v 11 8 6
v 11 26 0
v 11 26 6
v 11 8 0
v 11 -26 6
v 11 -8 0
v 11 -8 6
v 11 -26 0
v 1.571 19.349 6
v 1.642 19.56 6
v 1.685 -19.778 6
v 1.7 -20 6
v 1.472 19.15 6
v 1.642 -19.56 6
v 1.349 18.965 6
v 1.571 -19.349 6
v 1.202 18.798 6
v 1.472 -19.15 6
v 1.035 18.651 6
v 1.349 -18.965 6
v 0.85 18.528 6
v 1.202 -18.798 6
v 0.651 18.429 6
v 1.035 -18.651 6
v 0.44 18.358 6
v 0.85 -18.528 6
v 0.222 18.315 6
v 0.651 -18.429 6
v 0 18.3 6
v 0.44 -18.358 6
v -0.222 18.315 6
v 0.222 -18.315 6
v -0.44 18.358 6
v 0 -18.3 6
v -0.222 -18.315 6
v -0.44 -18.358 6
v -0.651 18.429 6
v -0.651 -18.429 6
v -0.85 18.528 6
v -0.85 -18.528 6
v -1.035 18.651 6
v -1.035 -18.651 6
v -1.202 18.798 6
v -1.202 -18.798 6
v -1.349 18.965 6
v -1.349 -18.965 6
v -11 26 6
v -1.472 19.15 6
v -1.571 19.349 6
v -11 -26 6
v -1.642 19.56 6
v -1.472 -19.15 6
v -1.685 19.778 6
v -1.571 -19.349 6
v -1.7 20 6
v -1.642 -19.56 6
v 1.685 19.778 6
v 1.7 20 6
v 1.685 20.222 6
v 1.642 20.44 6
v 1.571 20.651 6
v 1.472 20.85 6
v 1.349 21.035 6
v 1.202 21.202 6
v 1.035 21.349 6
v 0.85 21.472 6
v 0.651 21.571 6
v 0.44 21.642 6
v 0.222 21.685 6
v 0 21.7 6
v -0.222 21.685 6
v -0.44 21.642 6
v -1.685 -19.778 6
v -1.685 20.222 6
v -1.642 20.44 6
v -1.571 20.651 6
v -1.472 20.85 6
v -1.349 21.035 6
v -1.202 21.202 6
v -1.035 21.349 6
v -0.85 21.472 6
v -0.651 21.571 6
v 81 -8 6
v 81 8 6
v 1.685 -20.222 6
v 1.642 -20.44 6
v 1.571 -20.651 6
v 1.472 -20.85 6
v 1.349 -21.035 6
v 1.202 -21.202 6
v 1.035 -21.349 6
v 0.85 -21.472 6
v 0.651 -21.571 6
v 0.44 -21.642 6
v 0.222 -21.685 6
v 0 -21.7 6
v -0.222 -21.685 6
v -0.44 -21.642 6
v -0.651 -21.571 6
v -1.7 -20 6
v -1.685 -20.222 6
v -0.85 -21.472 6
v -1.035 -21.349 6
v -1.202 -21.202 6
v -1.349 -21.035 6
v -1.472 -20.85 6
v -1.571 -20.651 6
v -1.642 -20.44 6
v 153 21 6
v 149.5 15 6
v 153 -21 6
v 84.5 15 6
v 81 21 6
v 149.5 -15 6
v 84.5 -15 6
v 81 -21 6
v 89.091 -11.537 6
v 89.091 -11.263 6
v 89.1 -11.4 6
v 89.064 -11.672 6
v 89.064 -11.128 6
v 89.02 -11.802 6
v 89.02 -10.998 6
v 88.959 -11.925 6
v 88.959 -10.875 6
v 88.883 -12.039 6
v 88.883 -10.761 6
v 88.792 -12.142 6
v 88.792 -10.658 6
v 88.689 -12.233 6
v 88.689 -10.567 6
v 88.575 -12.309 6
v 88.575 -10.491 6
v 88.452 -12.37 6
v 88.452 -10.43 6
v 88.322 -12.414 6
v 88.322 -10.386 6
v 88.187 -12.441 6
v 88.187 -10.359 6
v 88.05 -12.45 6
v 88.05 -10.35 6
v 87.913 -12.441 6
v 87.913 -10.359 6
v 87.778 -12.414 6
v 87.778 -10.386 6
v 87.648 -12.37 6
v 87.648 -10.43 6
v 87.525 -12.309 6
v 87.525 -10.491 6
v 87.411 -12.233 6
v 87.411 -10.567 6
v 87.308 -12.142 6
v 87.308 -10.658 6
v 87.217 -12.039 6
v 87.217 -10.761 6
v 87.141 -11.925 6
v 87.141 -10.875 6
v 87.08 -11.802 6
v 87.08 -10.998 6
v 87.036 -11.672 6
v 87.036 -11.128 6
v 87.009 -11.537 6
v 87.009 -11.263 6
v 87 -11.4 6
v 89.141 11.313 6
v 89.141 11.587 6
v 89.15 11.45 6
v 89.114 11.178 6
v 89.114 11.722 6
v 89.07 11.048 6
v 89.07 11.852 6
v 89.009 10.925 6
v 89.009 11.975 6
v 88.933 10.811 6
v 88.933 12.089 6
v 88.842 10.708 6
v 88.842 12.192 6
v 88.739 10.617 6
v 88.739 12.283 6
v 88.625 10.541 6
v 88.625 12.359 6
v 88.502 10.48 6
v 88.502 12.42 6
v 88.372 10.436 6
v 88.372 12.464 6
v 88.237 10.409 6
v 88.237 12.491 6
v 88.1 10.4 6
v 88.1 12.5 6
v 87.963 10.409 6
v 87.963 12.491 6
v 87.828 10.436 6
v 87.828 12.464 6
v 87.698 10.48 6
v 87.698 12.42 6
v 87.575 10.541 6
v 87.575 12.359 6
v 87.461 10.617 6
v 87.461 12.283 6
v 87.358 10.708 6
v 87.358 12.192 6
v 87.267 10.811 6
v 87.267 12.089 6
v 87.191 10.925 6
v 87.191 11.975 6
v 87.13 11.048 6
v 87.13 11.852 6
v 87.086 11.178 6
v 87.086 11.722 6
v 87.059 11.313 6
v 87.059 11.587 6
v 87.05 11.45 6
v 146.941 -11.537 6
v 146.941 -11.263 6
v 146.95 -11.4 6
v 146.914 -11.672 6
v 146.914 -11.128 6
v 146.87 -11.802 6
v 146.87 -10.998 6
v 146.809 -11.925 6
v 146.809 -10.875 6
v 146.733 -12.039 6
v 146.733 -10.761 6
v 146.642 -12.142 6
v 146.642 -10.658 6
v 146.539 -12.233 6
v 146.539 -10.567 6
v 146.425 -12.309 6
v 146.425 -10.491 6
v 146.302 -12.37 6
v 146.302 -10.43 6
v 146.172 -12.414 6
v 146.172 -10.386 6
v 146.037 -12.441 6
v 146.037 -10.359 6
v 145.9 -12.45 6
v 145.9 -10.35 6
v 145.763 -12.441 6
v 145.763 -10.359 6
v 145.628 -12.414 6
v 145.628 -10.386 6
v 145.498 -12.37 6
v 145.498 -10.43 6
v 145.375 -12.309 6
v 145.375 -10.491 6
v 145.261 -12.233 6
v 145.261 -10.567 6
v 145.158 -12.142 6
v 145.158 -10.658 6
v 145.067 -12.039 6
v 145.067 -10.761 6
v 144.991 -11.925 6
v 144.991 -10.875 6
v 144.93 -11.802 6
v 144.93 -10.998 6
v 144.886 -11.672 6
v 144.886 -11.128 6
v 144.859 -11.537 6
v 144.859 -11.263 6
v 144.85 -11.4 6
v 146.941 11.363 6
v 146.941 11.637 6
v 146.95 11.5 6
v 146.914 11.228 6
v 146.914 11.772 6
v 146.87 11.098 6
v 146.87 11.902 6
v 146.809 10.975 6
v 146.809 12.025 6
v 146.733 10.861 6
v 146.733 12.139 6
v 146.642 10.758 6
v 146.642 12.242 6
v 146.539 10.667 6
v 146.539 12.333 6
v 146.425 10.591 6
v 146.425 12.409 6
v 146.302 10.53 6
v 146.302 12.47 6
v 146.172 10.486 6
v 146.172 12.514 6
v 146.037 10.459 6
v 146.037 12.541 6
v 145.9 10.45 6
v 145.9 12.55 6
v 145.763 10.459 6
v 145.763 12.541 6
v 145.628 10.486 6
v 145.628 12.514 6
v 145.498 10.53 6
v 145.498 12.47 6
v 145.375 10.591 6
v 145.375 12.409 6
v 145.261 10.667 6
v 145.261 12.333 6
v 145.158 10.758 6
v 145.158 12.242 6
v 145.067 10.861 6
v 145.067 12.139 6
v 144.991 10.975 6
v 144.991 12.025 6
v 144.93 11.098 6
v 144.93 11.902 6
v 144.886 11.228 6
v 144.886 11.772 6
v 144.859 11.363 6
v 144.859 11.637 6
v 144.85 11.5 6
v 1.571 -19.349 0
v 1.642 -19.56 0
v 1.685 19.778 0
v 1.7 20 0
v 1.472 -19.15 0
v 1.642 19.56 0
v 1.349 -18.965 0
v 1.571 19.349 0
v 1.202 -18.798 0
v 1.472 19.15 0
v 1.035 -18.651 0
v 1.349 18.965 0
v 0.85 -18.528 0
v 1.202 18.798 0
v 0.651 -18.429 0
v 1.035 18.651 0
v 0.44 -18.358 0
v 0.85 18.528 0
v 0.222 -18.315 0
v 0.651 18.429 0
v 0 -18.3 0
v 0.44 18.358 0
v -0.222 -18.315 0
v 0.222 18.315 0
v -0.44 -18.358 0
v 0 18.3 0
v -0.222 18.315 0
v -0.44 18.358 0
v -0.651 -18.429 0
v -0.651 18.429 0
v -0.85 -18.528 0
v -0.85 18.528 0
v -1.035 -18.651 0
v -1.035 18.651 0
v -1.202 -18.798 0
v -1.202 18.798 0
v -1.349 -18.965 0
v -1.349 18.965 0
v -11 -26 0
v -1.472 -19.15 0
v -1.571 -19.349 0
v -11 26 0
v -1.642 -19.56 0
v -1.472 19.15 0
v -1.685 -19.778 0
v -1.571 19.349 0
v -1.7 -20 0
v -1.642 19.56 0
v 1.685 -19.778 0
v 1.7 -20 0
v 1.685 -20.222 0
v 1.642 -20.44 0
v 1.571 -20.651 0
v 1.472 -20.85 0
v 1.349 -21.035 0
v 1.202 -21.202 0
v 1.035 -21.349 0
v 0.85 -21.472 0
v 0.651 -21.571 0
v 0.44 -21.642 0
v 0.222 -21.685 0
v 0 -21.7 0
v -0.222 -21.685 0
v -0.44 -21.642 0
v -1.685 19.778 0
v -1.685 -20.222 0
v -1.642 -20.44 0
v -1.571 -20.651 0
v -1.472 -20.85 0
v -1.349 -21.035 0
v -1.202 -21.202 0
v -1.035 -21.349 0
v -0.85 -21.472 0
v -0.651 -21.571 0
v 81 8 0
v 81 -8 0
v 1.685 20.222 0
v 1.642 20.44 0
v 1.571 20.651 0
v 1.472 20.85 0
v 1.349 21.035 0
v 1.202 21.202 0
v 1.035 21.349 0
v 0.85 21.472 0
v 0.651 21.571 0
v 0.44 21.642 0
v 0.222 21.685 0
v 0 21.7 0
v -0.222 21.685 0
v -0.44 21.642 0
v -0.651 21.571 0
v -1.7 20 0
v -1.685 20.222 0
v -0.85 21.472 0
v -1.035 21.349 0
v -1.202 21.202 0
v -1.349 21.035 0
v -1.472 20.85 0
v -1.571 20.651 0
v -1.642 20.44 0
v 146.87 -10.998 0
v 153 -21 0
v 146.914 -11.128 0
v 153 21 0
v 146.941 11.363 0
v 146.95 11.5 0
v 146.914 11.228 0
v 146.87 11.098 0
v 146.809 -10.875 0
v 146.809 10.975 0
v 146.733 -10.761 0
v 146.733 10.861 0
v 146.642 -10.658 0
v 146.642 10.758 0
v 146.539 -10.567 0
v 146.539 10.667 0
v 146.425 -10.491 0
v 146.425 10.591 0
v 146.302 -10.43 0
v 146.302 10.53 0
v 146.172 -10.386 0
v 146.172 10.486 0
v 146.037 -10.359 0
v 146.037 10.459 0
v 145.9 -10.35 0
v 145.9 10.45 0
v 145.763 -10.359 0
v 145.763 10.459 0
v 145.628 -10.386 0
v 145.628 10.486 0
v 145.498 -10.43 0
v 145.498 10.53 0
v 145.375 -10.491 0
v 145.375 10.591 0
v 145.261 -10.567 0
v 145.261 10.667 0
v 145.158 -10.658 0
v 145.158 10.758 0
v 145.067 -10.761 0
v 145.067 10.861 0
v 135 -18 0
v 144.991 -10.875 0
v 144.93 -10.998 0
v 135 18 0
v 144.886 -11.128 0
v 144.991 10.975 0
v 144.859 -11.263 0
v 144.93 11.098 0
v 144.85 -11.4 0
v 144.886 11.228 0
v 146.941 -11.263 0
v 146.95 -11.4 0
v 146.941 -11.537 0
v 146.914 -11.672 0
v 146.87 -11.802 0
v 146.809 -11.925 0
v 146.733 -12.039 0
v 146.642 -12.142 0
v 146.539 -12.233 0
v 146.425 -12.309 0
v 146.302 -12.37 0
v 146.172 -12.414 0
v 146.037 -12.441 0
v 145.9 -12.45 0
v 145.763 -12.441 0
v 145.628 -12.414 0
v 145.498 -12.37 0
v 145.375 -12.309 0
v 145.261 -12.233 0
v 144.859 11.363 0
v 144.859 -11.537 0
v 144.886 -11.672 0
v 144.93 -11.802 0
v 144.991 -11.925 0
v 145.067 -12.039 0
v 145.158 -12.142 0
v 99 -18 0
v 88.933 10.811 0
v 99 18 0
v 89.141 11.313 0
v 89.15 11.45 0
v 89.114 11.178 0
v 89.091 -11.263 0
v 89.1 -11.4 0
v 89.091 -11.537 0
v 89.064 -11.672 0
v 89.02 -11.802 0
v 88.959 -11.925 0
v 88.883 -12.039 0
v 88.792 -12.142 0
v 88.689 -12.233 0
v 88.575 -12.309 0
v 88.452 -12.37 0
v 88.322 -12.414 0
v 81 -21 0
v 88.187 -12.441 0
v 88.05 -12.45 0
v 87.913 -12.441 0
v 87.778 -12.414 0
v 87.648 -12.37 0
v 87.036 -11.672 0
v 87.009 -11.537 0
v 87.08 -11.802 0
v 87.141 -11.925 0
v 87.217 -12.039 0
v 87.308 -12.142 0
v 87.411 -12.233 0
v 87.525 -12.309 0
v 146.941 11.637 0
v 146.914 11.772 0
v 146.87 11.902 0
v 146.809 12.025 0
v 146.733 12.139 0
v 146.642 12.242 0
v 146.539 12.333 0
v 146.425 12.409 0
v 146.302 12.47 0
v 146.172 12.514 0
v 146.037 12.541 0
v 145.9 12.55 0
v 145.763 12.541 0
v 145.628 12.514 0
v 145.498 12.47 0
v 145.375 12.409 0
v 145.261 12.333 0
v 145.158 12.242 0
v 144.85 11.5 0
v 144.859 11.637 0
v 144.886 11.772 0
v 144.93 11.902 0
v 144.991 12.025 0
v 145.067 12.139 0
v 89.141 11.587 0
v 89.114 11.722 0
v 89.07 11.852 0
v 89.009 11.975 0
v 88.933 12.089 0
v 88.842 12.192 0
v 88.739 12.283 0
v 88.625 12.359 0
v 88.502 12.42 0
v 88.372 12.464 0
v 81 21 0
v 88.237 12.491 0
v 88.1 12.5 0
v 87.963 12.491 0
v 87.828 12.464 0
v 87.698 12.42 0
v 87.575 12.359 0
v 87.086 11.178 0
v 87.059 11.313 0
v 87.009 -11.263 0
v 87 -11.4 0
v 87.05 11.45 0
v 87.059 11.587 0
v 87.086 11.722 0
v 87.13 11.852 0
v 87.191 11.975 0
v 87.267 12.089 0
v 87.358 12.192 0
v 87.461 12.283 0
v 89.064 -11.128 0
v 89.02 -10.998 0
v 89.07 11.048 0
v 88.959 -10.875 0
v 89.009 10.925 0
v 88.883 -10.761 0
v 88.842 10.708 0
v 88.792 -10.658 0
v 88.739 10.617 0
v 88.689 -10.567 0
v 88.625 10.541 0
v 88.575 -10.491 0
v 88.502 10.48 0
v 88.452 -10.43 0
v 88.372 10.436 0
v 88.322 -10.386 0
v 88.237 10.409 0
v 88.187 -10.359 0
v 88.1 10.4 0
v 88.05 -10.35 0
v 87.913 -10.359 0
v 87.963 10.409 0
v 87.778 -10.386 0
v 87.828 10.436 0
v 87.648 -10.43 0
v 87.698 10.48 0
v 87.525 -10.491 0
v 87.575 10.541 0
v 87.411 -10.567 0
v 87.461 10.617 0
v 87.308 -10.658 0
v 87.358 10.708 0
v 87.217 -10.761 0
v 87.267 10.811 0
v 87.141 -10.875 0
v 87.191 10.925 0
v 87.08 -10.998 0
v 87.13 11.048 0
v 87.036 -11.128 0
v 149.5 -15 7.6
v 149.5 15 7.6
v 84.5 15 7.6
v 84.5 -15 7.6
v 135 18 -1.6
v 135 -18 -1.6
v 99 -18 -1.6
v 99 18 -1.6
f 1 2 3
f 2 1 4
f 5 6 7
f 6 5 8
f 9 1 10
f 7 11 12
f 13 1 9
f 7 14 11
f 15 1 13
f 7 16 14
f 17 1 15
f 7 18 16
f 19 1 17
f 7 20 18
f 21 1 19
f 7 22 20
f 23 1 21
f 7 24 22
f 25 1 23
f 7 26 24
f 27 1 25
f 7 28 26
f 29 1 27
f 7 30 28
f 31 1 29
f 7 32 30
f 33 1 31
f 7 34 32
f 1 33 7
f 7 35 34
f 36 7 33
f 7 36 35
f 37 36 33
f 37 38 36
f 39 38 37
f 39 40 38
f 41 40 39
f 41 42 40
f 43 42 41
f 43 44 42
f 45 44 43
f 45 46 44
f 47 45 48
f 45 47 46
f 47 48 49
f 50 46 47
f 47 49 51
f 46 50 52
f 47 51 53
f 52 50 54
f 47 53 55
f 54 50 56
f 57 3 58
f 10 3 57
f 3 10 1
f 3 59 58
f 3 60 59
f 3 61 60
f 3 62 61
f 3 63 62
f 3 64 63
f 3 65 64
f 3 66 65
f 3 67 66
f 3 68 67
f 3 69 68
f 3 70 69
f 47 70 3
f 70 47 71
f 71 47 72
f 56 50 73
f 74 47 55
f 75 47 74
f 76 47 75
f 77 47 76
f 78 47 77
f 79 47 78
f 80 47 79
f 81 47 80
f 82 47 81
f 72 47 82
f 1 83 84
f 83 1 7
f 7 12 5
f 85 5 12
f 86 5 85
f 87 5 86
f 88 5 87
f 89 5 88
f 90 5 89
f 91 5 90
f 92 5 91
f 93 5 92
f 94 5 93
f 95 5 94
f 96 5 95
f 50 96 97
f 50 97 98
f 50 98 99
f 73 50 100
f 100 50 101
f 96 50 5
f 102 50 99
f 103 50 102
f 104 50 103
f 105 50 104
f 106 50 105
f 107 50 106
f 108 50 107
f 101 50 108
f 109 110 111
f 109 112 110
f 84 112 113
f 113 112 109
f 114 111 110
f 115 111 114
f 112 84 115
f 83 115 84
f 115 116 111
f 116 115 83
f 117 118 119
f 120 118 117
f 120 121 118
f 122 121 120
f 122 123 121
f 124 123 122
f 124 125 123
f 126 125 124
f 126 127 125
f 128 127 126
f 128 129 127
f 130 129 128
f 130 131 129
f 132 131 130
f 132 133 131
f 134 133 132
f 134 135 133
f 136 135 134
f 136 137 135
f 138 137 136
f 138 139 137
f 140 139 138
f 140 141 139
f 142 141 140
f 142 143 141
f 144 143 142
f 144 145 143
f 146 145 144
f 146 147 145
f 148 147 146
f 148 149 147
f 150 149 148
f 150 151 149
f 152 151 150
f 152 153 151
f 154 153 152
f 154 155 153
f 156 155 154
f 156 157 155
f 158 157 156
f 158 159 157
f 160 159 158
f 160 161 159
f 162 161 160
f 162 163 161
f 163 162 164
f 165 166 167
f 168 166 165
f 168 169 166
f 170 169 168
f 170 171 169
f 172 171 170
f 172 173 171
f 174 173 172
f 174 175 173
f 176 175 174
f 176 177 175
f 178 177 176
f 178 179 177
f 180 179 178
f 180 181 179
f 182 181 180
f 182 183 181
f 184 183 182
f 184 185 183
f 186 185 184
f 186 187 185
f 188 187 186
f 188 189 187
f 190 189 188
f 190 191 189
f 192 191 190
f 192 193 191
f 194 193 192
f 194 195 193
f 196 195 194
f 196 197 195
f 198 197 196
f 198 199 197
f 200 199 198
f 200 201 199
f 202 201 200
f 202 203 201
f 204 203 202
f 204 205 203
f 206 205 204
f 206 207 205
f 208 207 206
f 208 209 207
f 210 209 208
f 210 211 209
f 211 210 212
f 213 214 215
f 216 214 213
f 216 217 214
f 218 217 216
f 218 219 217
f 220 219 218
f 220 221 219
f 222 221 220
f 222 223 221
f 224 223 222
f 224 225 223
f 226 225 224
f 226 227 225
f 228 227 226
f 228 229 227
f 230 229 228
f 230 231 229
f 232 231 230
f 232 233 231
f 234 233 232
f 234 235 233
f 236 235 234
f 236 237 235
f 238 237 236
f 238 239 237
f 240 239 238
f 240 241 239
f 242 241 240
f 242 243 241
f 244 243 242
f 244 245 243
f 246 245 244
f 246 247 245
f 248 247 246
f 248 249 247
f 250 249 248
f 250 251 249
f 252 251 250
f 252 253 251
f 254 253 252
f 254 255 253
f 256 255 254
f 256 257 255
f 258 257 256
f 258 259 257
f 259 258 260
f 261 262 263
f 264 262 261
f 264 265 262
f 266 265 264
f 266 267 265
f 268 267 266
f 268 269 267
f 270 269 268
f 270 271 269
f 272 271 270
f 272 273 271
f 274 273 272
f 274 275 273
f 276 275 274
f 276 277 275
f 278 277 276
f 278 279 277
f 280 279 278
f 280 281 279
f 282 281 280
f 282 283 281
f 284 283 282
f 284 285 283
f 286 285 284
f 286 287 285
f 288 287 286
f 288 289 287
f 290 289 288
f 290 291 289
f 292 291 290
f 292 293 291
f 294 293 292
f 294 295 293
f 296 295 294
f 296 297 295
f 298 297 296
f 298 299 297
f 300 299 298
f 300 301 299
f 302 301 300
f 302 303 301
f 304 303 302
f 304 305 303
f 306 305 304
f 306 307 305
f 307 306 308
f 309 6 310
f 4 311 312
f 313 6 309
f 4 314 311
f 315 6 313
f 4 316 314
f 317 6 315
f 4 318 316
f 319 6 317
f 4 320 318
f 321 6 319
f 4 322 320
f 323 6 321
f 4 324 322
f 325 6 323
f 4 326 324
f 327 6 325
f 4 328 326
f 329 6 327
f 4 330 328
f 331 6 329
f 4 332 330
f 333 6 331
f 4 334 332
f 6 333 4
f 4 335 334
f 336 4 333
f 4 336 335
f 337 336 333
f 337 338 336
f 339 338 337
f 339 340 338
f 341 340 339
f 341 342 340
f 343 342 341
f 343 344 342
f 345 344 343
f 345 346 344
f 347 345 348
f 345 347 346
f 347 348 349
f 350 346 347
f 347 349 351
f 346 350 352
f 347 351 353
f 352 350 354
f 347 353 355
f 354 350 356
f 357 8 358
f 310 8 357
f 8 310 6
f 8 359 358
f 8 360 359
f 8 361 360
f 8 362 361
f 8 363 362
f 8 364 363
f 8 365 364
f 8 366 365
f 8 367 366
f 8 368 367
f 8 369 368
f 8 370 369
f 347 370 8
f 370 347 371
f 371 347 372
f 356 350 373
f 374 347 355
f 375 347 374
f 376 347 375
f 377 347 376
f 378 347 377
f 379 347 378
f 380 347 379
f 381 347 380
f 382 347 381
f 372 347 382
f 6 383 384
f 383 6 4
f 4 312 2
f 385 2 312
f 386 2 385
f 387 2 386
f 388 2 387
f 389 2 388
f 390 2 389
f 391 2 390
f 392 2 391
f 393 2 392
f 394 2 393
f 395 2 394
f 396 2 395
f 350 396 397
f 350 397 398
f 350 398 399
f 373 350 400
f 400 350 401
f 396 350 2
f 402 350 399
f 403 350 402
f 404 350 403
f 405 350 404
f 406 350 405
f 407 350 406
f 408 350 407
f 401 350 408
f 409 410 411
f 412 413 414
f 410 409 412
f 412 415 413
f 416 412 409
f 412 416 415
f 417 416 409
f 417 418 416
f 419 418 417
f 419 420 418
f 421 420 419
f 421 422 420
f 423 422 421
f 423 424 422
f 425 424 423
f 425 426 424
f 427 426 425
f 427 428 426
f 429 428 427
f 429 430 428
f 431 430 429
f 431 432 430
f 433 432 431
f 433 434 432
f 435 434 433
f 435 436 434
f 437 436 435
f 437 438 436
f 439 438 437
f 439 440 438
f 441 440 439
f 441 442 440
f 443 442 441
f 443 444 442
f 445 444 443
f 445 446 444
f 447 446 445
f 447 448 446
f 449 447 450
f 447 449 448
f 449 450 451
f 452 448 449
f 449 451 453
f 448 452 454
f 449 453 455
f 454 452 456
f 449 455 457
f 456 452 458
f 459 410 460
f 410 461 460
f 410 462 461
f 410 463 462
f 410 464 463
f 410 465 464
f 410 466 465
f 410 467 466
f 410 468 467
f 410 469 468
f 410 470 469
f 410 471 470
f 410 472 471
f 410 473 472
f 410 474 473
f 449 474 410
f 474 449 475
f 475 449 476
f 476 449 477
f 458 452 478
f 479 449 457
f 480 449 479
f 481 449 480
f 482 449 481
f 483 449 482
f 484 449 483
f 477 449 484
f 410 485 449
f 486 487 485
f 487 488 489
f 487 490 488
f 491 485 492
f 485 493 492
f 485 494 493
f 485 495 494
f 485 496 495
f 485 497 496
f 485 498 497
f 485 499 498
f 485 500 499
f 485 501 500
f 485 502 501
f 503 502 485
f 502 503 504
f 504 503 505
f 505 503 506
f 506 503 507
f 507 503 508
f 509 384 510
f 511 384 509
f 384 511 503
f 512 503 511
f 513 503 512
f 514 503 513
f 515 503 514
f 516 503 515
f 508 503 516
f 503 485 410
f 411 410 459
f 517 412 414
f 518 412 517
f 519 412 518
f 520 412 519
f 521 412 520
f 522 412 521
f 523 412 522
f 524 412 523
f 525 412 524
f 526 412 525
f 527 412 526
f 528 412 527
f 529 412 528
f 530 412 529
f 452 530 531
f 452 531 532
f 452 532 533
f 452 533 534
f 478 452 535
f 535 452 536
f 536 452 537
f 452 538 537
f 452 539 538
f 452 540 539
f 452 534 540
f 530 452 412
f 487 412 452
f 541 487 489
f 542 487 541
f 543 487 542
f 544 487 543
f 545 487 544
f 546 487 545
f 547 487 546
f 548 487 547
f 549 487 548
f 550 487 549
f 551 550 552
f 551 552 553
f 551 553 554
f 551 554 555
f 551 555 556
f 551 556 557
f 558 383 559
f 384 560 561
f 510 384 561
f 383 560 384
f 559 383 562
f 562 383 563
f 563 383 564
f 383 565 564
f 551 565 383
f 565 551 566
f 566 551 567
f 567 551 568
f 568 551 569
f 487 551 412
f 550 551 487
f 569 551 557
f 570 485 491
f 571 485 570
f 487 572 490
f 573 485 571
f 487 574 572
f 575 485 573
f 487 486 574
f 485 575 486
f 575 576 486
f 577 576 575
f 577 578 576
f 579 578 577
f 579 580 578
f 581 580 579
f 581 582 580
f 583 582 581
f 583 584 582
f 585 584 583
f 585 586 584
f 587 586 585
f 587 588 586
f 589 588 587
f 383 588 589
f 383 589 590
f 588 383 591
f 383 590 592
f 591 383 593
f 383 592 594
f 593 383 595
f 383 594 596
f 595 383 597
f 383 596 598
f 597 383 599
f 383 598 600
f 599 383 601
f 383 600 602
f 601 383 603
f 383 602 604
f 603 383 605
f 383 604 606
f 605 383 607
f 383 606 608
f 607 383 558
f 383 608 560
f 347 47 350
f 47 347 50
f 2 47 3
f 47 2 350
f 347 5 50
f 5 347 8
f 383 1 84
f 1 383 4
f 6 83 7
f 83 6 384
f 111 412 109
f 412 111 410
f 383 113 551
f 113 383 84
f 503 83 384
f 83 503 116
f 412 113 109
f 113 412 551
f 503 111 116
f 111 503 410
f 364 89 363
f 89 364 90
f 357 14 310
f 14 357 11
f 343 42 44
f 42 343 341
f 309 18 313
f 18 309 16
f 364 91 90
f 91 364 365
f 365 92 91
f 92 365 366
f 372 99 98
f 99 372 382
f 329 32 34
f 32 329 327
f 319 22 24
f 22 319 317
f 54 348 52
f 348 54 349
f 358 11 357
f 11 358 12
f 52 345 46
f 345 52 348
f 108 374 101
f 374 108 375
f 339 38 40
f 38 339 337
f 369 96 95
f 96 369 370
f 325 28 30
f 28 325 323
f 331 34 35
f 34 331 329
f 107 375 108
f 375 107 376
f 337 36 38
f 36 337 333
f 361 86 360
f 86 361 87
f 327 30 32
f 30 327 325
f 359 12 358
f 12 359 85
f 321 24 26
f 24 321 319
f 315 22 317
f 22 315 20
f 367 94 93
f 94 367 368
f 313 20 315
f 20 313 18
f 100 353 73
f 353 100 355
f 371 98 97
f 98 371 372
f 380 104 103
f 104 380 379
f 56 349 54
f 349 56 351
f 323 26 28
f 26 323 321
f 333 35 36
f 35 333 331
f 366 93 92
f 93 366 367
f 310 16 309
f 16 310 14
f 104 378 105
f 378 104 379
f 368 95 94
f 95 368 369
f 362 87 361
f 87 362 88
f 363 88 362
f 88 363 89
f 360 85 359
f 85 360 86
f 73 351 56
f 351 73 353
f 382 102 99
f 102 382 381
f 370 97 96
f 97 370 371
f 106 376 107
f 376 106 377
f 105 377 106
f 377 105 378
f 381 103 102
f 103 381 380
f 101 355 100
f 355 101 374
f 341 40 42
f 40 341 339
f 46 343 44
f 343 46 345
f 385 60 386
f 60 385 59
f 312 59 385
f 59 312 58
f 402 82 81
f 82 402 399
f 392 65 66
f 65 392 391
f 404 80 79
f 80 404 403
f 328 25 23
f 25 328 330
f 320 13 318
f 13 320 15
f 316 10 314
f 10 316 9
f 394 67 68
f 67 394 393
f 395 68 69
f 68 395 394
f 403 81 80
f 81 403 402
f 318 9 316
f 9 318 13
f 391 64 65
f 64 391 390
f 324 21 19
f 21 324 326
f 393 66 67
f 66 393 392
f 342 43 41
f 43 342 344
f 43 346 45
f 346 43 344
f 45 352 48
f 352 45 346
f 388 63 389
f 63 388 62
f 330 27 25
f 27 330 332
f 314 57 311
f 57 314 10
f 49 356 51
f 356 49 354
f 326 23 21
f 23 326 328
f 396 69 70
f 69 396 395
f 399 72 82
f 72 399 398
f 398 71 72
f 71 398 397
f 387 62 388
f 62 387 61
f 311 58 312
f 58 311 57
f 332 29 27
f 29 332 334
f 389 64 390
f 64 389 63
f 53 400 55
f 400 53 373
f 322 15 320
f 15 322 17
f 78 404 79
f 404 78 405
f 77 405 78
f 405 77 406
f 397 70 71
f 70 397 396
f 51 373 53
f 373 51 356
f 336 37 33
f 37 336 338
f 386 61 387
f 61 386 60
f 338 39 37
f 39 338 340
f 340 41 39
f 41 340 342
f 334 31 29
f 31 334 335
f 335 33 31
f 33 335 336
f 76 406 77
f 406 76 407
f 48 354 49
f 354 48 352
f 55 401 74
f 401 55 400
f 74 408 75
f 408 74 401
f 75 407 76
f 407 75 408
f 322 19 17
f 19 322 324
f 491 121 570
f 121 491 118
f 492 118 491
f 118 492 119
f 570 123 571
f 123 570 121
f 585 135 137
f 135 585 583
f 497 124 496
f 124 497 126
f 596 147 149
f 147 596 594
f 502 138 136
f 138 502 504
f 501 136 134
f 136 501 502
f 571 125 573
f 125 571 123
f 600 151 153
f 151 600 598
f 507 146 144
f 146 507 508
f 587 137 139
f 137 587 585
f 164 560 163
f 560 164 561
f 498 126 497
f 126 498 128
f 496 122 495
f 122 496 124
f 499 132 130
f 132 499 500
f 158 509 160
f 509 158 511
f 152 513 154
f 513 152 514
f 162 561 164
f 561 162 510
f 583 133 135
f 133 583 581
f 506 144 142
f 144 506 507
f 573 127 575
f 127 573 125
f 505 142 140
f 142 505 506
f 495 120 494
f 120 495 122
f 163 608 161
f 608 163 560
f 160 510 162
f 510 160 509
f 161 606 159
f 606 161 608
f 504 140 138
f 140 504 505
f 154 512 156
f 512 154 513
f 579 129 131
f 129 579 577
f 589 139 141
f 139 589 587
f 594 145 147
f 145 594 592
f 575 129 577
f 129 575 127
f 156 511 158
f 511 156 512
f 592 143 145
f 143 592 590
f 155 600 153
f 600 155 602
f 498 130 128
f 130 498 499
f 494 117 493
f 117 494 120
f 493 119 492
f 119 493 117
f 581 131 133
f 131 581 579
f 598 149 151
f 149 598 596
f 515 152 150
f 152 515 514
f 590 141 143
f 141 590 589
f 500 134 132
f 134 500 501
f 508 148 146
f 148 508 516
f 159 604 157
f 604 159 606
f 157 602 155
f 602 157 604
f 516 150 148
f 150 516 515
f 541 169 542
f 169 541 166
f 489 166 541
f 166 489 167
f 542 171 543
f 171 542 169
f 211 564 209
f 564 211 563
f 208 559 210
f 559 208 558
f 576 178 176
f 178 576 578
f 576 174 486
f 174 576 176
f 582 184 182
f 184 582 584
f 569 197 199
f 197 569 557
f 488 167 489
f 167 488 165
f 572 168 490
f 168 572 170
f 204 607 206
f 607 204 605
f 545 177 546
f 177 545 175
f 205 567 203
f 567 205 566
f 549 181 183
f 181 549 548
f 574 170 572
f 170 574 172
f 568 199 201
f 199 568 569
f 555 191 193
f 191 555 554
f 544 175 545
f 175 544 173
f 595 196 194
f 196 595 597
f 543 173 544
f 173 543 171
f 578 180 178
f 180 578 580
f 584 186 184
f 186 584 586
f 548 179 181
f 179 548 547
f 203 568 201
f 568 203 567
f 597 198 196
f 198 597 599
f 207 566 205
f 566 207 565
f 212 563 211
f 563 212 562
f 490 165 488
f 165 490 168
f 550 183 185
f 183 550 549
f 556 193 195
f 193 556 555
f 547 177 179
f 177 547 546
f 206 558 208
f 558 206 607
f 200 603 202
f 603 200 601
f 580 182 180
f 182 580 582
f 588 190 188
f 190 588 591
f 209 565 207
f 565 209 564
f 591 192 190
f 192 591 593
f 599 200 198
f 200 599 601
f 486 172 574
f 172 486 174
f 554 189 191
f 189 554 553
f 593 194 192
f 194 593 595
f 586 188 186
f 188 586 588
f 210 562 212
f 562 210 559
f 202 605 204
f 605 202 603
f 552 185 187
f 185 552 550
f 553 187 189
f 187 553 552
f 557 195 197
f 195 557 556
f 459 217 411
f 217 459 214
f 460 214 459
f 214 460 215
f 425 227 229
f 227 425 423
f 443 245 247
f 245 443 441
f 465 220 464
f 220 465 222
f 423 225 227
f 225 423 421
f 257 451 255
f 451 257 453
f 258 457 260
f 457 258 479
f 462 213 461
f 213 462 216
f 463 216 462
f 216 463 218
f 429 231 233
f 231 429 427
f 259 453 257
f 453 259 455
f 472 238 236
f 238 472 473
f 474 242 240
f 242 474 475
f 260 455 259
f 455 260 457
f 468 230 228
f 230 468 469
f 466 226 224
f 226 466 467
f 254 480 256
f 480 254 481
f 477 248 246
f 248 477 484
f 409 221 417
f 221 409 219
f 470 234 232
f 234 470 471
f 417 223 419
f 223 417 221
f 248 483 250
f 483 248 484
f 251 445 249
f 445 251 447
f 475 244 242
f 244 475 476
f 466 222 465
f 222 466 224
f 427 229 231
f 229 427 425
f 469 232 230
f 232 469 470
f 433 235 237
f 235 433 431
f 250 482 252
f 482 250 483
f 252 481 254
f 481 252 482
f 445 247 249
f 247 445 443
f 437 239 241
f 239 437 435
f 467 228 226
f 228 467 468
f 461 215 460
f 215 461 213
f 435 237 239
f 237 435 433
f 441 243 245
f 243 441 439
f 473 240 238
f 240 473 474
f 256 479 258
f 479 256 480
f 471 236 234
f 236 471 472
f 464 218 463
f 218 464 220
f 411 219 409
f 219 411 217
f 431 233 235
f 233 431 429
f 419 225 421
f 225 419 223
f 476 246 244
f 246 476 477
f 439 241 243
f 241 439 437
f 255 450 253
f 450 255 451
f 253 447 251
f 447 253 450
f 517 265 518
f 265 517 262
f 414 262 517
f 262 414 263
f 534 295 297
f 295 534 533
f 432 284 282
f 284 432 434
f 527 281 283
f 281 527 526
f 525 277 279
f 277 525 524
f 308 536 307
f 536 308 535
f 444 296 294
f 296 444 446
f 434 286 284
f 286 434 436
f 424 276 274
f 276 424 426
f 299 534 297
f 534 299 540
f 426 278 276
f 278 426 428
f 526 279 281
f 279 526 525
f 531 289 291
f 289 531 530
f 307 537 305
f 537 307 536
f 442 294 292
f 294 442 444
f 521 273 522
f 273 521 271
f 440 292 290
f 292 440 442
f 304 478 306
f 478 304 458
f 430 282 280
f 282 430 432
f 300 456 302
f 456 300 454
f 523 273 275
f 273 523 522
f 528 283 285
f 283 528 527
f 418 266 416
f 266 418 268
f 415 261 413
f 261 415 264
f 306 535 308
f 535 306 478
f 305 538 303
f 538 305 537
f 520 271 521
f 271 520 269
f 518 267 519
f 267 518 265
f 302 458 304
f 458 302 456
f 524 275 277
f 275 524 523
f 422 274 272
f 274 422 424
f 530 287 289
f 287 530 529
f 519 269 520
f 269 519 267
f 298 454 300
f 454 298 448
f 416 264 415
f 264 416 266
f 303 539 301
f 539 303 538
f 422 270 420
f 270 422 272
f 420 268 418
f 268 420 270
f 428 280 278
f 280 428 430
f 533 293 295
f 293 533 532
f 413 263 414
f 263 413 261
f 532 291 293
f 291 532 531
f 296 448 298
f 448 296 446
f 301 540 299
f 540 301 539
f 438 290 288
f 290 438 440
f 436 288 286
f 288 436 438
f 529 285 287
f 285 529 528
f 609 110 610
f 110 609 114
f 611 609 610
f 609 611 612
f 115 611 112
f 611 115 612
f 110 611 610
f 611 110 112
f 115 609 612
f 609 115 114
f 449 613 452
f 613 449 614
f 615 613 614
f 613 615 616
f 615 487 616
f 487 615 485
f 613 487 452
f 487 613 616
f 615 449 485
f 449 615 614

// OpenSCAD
// Y-axis pad mount — Ender-3 V3 SE
// Keeps Twnzl/bioxz 40 mm vertical M3 pair (CC BY-SA concept).
// Drops the Pi Zero box. Solid shoe + truss + pad.
// One face: Zero 3W (65 x 30, M2.5 pilots). Other face: 3M-tape camera.
//
// PRINT: whole part is a 6 mm plate, large face on the bed. No lattice.
// part = "print" | "preview"

part = "preview"; // [print, preview]

$fn = 48;

screw_spacing = 40.0;
m3_clear      = 3.4;
t             = 6.0;

shoe_w = 22.0;
shoe_h = 52.0;

truss_w = 16.0;
truss_l = 70.0;

pad_w = 72.0;   // along truss (X)
pad_h = 42.0;   // across (Y)

z3w_x = 65.0;
z3w_y = 30.0;
z3w_holes = [[3.55,3.60],[3.60,26.45],[61.40,3.60],[61.40,26.50]];
z3w_pilot = 2.1;

// print coords: Z = thickness. Holes along Y. Truss +X.
// shoe centered on origin.
pad_x0 = shoe_w/2 + truss_l;
pad_cx = pad_x0 + pad_w/2;
pad_cy = 0;

module plate() {
    difference() {
        union() {
            translate([-shoe_w/2, -shoe_h/2, 0])
                cube([shoe_w, shoe_h, t]);
            translate([shoe_w/2 - 0.1, -truss_w/2, 0])
                cube([truss_l + 0.2, truss_w, t]);
            translate([pad_x0, -pad_h/2, 0])
                cube([pad_w, pad_h, t]);
        }
        for (sy = [-screw_spacing/2, screw_spacing/2])
            translate([0, sy, -1])
                cylinder(d = m3_clear, h = t + 2);
        // Zero 3W pilots through the pad (either face)
        for (hxy = z3w_holes)
            translate([
                pad_cx - z3w_x/2 + hxy[0],
                pad_cy - z3w_y/2 + hxy[1],
                -1
            ])
                cylinder(d = z3w_pilot, h = t + 2);
    }
}

module dummy_z3w() {
    color([0.15, 0.45, 0.18])
        translate([pad_cx - z3w_x/2, pad_cy - z3w_y/2, t])
            cube([z3w_x, z3w_y, 1.6]);
}

module dummy_cam() {
    // 36x36 on the bed face (other side), 3M tape
    color([0.22, 0.22, 0.25])
        translate([pad_cx - 18, pad_cy - 18, -1.6])
            cube([36, 36, 1.6]);
}

if (part == "print") plate();
if (part == "preview") {
    color([0.10, 0.10, 0.11]) plate();
    dummy_z3w();
    dummy_cam();
}
